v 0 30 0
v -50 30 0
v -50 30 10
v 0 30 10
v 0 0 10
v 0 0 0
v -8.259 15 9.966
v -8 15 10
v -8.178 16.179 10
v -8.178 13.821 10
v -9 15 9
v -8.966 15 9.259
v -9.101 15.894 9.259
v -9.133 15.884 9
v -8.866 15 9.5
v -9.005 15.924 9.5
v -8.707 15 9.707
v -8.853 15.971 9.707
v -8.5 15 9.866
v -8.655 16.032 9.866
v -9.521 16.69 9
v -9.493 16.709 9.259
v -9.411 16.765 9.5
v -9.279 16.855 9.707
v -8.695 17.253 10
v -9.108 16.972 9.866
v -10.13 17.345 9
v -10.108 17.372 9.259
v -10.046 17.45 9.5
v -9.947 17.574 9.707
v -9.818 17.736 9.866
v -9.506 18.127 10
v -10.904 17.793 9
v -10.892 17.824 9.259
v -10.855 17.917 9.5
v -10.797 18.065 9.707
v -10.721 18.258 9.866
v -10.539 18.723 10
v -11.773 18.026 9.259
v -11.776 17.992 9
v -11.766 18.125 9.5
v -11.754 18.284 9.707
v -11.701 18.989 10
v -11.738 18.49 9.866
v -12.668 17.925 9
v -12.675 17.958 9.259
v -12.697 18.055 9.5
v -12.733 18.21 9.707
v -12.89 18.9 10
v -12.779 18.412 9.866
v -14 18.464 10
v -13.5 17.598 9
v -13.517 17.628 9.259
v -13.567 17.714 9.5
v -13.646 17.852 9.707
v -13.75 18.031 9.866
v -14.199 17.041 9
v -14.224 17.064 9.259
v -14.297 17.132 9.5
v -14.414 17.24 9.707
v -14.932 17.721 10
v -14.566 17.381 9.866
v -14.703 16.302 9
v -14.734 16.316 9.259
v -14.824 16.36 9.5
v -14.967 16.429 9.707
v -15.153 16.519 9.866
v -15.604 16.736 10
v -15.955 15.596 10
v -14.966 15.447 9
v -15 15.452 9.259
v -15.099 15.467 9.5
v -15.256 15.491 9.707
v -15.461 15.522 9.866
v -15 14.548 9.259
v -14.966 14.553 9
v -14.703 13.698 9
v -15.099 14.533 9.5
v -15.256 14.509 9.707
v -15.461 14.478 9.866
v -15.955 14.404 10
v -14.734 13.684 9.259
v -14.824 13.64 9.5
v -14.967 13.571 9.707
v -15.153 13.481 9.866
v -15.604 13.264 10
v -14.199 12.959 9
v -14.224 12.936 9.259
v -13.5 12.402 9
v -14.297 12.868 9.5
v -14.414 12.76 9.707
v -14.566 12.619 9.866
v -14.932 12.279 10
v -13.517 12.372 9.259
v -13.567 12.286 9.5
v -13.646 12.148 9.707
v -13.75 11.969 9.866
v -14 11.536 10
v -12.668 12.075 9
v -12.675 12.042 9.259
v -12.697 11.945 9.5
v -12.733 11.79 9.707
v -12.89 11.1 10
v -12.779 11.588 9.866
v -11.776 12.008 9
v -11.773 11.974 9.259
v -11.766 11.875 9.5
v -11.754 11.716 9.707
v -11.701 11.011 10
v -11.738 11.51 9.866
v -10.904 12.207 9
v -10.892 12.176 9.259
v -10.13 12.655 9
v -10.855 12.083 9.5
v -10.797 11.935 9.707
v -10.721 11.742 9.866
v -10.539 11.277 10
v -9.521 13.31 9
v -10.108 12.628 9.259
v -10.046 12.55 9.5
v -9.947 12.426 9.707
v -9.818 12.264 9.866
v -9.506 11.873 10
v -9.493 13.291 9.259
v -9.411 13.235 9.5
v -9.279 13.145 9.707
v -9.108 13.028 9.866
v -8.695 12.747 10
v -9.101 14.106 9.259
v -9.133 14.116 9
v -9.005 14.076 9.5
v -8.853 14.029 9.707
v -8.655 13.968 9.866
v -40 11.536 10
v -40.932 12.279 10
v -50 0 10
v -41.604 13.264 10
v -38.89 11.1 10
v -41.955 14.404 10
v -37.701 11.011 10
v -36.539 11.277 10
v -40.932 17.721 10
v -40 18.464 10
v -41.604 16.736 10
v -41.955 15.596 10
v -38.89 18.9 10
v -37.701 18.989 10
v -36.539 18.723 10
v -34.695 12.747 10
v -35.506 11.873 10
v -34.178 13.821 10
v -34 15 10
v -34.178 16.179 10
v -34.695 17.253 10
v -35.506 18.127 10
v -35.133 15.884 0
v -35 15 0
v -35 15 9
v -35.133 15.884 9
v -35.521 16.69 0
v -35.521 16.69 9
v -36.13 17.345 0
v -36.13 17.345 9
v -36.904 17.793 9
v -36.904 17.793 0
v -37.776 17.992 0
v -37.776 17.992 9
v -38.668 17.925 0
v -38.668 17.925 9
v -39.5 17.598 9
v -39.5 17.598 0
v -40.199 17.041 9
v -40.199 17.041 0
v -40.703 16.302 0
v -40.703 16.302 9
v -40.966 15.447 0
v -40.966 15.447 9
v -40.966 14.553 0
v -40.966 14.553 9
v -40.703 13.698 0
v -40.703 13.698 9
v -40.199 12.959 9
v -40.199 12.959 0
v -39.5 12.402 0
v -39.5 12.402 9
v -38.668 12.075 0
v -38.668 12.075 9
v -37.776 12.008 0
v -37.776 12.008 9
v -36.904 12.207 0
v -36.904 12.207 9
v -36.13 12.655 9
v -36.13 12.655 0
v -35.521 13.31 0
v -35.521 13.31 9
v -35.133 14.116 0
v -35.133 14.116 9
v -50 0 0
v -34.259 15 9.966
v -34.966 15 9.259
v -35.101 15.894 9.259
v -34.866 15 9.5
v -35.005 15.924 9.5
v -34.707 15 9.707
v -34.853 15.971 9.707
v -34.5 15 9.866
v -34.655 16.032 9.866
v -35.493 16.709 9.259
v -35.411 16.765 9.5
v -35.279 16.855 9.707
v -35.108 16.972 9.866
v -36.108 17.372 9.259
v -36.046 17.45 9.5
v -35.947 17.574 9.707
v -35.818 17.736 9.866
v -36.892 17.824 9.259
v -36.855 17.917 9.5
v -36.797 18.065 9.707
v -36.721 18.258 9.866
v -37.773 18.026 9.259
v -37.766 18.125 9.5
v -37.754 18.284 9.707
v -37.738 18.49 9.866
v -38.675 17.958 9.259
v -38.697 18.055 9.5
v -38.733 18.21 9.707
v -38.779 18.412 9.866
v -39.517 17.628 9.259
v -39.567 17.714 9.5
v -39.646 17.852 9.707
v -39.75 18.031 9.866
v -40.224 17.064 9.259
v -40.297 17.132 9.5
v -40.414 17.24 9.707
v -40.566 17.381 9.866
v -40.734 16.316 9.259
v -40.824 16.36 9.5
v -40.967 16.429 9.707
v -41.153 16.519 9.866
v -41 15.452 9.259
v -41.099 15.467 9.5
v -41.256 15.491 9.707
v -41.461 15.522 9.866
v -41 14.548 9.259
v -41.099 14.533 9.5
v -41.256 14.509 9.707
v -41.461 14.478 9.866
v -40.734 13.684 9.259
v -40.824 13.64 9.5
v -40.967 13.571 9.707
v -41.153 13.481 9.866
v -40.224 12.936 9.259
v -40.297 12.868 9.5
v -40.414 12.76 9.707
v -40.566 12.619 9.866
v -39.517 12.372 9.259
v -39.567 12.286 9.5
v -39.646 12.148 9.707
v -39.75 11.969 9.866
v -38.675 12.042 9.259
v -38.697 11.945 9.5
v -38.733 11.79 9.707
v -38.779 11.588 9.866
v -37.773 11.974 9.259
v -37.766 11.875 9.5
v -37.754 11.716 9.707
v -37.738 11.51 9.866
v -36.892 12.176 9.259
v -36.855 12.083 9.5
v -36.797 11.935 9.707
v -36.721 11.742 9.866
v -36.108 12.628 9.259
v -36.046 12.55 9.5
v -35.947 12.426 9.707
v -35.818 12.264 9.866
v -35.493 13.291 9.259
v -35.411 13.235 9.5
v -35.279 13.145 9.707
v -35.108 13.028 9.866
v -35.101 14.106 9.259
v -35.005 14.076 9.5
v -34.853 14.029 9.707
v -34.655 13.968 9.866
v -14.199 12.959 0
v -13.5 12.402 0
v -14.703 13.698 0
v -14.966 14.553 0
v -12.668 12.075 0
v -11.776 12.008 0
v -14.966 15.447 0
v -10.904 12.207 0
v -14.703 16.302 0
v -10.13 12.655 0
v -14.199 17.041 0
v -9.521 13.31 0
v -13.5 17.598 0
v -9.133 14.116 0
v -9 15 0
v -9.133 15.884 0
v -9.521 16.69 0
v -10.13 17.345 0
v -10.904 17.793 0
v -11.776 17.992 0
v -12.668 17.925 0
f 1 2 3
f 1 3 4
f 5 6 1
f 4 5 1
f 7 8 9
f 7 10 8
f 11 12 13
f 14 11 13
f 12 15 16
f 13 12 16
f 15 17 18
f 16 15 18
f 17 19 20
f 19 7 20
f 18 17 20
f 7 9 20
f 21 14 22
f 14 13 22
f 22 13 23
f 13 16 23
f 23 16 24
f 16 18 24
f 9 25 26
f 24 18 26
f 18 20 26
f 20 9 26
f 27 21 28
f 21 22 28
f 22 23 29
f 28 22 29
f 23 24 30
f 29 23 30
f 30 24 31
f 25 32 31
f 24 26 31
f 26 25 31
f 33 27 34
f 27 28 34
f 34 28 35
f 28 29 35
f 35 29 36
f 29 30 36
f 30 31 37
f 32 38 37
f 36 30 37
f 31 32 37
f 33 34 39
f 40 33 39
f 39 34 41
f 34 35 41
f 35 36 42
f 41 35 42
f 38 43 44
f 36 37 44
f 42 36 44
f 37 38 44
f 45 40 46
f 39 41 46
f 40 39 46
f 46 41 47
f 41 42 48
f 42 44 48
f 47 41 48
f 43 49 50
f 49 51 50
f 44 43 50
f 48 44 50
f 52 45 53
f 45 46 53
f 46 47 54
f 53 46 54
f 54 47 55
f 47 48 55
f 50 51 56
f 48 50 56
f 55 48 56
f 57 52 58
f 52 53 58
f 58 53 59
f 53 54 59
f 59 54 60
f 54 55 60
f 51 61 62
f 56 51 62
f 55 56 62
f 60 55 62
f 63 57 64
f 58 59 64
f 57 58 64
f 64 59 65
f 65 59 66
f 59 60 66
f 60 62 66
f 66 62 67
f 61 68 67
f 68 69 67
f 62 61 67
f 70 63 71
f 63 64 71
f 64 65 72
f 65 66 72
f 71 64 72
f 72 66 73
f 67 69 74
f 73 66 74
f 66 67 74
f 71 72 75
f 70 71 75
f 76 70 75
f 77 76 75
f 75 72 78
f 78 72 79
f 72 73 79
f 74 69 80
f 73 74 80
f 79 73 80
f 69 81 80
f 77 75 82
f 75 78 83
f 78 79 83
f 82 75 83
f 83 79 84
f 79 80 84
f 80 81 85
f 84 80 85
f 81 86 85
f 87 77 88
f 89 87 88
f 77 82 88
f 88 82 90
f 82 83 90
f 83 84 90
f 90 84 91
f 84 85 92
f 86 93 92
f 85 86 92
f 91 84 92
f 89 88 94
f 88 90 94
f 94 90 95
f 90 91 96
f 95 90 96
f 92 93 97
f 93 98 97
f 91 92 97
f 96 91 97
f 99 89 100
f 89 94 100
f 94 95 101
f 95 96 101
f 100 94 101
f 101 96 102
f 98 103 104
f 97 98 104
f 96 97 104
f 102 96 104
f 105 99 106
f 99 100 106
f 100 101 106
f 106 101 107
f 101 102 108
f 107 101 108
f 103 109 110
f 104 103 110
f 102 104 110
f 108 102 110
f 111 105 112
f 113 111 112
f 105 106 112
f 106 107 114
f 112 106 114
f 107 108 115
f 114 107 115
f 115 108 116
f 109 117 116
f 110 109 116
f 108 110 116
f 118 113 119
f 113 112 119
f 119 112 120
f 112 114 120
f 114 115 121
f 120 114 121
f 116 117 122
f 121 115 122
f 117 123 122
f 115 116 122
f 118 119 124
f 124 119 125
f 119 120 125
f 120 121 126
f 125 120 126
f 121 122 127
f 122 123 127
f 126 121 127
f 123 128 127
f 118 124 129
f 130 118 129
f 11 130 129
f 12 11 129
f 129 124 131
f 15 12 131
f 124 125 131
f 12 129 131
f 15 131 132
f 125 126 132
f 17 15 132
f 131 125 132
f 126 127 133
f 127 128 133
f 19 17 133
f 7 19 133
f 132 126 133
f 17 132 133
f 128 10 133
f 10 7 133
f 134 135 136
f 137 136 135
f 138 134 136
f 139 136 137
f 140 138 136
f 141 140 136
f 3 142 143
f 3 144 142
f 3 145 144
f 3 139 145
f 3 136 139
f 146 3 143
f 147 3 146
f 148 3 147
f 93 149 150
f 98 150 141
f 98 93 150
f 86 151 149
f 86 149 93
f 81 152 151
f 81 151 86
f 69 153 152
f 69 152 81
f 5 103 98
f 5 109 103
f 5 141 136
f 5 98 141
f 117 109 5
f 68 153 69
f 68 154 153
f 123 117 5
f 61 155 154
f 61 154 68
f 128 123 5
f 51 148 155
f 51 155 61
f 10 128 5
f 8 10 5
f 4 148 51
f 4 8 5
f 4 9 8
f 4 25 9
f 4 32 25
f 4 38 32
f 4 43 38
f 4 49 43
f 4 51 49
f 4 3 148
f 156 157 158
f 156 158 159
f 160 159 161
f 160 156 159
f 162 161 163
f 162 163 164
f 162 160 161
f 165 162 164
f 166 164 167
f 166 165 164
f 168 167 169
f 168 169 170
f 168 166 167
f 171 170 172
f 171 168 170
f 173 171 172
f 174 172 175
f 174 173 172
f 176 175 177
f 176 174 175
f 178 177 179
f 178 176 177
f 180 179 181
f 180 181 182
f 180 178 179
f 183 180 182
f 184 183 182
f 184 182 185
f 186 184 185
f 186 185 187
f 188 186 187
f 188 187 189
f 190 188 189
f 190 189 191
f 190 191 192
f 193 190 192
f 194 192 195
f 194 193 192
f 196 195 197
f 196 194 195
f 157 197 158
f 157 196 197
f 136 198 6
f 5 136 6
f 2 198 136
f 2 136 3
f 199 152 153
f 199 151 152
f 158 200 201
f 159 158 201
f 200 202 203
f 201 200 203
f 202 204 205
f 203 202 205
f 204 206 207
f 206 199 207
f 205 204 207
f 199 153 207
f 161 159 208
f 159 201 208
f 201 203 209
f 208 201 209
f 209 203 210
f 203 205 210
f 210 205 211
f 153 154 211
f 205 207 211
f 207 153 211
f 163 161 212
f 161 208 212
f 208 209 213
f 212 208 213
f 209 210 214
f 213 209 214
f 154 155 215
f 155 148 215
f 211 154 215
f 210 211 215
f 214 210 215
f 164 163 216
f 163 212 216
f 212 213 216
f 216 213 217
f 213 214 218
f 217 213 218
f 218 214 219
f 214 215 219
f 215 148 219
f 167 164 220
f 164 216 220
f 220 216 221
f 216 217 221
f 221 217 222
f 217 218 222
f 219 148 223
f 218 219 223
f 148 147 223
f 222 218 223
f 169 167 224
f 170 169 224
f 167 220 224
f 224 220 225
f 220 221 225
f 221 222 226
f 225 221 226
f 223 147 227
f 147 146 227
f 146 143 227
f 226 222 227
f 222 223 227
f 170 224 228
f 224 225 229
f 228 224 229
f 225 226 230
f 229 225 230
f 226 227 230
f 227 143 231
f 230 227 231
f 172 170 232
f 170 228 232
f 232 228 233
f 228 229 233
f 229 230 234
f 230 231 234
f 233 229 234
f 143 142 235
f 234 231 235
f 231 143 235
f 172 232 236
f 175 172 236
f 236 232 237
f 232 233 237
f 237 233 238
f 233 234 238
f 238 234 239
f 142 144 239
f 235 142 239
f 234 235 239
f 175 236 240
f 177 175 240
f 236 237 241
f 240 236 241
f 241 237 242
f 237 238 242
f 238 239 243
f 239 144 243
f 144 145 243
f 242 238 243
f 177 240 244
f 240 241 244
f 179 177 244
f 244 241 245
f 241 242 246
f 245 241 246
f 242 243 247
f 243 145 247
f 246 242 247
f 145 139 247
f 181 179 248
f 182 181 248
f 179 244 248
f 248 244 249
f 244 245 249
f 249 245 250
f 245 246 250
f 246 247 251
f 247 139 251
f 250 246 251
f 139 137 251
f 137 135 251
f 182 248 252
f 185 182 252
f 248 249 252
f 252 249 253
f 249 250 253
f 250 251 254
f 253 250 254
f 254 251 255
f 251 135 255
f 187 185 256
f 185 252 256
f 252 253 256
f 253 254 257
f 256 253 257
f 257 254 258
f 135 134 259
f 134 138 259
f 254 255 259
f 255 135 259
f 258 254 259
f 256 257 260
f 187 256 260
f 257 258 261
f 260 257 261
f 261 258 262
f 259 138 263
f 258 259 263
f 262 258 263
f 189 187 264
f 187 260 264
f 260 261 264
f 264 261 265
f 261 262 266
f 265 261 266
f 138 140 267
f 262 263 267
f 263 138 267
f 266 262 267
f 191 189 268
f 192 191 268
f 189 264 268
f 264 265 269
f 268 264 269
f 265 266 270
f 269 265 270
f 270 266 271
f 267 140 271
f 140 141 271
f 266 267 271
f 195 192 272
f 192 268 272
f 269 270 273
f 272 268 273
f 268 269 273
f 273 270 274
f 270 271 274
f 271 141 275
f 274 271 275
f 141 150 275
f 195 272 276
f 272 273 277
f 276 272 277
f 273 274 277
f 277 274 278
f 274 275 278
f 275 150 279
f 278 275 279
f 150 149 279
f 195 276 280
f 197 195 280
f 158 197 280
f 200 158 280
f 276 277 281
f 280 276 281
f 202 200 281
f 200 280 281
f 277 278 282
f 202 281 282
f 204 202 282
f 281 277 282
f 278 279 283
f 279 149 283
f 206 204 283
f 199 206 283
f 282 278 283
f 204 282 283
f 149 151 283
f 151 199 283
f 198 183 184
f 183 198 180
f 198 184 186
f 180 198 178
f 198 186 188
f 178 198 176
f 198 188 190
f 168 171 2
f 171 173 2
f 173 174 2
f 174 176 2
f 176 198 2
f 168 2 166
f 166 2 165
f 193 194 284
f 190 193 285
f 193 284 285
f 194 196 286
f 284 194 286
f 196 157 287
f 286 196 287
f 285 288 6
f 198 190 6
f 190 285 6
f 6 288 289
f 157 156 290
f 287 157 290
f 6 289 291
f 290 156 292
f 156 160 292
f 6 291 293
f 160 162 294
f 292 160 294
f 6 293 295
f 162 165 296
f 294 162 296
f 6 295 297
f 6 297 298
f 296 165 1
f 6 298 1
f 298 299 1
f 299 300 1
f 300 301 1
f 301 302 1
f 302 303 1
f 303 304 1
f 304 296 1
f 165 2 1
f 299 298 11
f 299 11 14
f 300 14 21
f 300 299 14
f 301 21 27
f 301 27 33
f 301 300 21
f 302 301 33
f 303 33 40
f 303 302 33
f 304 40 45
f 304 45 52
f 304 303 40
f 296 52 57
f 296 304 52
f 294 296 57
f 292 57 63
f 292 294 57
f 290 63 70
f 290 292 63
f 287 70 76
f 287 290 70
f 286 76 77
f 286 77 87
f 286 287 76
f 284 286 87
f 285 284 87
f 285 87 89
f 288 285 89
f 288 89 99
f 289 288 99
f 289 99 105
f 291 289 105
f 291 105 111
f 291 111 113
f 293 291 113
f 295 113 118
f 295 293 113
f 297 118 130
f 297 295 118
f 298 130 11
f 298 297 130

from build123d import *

# Parameters (mm, degrees)
F0_W     = 50
F0_H     = 30
F0_R     = 3
F1_DEPTH = 10
F2_R     = 1


with BuildPart() as f1:
    # F0 (on Top) → F1 (new body)
    with BuildSketch(Plane.XY):
        with Locations((-25, 15)):
            Rectangle(F0_W, F0_H)
        with Locations((-38, 15)):
            Circle(F0_R, mode=Mode.SUBTRACT)
        with Locations((-12, 15)):
            Circle(F0_R, mode=Mode.SUBTRACT)
    extrude(amount=F1_DEPTH)

    # F2
    f2_edges = [f1.edges().sort_by_distance(p)[0] for p in [
        (-41, 15, 10),
        (-15, 15, 10),
    ]]
    fillet(f2_edges, radius=F2_R)


solid = f1.part
